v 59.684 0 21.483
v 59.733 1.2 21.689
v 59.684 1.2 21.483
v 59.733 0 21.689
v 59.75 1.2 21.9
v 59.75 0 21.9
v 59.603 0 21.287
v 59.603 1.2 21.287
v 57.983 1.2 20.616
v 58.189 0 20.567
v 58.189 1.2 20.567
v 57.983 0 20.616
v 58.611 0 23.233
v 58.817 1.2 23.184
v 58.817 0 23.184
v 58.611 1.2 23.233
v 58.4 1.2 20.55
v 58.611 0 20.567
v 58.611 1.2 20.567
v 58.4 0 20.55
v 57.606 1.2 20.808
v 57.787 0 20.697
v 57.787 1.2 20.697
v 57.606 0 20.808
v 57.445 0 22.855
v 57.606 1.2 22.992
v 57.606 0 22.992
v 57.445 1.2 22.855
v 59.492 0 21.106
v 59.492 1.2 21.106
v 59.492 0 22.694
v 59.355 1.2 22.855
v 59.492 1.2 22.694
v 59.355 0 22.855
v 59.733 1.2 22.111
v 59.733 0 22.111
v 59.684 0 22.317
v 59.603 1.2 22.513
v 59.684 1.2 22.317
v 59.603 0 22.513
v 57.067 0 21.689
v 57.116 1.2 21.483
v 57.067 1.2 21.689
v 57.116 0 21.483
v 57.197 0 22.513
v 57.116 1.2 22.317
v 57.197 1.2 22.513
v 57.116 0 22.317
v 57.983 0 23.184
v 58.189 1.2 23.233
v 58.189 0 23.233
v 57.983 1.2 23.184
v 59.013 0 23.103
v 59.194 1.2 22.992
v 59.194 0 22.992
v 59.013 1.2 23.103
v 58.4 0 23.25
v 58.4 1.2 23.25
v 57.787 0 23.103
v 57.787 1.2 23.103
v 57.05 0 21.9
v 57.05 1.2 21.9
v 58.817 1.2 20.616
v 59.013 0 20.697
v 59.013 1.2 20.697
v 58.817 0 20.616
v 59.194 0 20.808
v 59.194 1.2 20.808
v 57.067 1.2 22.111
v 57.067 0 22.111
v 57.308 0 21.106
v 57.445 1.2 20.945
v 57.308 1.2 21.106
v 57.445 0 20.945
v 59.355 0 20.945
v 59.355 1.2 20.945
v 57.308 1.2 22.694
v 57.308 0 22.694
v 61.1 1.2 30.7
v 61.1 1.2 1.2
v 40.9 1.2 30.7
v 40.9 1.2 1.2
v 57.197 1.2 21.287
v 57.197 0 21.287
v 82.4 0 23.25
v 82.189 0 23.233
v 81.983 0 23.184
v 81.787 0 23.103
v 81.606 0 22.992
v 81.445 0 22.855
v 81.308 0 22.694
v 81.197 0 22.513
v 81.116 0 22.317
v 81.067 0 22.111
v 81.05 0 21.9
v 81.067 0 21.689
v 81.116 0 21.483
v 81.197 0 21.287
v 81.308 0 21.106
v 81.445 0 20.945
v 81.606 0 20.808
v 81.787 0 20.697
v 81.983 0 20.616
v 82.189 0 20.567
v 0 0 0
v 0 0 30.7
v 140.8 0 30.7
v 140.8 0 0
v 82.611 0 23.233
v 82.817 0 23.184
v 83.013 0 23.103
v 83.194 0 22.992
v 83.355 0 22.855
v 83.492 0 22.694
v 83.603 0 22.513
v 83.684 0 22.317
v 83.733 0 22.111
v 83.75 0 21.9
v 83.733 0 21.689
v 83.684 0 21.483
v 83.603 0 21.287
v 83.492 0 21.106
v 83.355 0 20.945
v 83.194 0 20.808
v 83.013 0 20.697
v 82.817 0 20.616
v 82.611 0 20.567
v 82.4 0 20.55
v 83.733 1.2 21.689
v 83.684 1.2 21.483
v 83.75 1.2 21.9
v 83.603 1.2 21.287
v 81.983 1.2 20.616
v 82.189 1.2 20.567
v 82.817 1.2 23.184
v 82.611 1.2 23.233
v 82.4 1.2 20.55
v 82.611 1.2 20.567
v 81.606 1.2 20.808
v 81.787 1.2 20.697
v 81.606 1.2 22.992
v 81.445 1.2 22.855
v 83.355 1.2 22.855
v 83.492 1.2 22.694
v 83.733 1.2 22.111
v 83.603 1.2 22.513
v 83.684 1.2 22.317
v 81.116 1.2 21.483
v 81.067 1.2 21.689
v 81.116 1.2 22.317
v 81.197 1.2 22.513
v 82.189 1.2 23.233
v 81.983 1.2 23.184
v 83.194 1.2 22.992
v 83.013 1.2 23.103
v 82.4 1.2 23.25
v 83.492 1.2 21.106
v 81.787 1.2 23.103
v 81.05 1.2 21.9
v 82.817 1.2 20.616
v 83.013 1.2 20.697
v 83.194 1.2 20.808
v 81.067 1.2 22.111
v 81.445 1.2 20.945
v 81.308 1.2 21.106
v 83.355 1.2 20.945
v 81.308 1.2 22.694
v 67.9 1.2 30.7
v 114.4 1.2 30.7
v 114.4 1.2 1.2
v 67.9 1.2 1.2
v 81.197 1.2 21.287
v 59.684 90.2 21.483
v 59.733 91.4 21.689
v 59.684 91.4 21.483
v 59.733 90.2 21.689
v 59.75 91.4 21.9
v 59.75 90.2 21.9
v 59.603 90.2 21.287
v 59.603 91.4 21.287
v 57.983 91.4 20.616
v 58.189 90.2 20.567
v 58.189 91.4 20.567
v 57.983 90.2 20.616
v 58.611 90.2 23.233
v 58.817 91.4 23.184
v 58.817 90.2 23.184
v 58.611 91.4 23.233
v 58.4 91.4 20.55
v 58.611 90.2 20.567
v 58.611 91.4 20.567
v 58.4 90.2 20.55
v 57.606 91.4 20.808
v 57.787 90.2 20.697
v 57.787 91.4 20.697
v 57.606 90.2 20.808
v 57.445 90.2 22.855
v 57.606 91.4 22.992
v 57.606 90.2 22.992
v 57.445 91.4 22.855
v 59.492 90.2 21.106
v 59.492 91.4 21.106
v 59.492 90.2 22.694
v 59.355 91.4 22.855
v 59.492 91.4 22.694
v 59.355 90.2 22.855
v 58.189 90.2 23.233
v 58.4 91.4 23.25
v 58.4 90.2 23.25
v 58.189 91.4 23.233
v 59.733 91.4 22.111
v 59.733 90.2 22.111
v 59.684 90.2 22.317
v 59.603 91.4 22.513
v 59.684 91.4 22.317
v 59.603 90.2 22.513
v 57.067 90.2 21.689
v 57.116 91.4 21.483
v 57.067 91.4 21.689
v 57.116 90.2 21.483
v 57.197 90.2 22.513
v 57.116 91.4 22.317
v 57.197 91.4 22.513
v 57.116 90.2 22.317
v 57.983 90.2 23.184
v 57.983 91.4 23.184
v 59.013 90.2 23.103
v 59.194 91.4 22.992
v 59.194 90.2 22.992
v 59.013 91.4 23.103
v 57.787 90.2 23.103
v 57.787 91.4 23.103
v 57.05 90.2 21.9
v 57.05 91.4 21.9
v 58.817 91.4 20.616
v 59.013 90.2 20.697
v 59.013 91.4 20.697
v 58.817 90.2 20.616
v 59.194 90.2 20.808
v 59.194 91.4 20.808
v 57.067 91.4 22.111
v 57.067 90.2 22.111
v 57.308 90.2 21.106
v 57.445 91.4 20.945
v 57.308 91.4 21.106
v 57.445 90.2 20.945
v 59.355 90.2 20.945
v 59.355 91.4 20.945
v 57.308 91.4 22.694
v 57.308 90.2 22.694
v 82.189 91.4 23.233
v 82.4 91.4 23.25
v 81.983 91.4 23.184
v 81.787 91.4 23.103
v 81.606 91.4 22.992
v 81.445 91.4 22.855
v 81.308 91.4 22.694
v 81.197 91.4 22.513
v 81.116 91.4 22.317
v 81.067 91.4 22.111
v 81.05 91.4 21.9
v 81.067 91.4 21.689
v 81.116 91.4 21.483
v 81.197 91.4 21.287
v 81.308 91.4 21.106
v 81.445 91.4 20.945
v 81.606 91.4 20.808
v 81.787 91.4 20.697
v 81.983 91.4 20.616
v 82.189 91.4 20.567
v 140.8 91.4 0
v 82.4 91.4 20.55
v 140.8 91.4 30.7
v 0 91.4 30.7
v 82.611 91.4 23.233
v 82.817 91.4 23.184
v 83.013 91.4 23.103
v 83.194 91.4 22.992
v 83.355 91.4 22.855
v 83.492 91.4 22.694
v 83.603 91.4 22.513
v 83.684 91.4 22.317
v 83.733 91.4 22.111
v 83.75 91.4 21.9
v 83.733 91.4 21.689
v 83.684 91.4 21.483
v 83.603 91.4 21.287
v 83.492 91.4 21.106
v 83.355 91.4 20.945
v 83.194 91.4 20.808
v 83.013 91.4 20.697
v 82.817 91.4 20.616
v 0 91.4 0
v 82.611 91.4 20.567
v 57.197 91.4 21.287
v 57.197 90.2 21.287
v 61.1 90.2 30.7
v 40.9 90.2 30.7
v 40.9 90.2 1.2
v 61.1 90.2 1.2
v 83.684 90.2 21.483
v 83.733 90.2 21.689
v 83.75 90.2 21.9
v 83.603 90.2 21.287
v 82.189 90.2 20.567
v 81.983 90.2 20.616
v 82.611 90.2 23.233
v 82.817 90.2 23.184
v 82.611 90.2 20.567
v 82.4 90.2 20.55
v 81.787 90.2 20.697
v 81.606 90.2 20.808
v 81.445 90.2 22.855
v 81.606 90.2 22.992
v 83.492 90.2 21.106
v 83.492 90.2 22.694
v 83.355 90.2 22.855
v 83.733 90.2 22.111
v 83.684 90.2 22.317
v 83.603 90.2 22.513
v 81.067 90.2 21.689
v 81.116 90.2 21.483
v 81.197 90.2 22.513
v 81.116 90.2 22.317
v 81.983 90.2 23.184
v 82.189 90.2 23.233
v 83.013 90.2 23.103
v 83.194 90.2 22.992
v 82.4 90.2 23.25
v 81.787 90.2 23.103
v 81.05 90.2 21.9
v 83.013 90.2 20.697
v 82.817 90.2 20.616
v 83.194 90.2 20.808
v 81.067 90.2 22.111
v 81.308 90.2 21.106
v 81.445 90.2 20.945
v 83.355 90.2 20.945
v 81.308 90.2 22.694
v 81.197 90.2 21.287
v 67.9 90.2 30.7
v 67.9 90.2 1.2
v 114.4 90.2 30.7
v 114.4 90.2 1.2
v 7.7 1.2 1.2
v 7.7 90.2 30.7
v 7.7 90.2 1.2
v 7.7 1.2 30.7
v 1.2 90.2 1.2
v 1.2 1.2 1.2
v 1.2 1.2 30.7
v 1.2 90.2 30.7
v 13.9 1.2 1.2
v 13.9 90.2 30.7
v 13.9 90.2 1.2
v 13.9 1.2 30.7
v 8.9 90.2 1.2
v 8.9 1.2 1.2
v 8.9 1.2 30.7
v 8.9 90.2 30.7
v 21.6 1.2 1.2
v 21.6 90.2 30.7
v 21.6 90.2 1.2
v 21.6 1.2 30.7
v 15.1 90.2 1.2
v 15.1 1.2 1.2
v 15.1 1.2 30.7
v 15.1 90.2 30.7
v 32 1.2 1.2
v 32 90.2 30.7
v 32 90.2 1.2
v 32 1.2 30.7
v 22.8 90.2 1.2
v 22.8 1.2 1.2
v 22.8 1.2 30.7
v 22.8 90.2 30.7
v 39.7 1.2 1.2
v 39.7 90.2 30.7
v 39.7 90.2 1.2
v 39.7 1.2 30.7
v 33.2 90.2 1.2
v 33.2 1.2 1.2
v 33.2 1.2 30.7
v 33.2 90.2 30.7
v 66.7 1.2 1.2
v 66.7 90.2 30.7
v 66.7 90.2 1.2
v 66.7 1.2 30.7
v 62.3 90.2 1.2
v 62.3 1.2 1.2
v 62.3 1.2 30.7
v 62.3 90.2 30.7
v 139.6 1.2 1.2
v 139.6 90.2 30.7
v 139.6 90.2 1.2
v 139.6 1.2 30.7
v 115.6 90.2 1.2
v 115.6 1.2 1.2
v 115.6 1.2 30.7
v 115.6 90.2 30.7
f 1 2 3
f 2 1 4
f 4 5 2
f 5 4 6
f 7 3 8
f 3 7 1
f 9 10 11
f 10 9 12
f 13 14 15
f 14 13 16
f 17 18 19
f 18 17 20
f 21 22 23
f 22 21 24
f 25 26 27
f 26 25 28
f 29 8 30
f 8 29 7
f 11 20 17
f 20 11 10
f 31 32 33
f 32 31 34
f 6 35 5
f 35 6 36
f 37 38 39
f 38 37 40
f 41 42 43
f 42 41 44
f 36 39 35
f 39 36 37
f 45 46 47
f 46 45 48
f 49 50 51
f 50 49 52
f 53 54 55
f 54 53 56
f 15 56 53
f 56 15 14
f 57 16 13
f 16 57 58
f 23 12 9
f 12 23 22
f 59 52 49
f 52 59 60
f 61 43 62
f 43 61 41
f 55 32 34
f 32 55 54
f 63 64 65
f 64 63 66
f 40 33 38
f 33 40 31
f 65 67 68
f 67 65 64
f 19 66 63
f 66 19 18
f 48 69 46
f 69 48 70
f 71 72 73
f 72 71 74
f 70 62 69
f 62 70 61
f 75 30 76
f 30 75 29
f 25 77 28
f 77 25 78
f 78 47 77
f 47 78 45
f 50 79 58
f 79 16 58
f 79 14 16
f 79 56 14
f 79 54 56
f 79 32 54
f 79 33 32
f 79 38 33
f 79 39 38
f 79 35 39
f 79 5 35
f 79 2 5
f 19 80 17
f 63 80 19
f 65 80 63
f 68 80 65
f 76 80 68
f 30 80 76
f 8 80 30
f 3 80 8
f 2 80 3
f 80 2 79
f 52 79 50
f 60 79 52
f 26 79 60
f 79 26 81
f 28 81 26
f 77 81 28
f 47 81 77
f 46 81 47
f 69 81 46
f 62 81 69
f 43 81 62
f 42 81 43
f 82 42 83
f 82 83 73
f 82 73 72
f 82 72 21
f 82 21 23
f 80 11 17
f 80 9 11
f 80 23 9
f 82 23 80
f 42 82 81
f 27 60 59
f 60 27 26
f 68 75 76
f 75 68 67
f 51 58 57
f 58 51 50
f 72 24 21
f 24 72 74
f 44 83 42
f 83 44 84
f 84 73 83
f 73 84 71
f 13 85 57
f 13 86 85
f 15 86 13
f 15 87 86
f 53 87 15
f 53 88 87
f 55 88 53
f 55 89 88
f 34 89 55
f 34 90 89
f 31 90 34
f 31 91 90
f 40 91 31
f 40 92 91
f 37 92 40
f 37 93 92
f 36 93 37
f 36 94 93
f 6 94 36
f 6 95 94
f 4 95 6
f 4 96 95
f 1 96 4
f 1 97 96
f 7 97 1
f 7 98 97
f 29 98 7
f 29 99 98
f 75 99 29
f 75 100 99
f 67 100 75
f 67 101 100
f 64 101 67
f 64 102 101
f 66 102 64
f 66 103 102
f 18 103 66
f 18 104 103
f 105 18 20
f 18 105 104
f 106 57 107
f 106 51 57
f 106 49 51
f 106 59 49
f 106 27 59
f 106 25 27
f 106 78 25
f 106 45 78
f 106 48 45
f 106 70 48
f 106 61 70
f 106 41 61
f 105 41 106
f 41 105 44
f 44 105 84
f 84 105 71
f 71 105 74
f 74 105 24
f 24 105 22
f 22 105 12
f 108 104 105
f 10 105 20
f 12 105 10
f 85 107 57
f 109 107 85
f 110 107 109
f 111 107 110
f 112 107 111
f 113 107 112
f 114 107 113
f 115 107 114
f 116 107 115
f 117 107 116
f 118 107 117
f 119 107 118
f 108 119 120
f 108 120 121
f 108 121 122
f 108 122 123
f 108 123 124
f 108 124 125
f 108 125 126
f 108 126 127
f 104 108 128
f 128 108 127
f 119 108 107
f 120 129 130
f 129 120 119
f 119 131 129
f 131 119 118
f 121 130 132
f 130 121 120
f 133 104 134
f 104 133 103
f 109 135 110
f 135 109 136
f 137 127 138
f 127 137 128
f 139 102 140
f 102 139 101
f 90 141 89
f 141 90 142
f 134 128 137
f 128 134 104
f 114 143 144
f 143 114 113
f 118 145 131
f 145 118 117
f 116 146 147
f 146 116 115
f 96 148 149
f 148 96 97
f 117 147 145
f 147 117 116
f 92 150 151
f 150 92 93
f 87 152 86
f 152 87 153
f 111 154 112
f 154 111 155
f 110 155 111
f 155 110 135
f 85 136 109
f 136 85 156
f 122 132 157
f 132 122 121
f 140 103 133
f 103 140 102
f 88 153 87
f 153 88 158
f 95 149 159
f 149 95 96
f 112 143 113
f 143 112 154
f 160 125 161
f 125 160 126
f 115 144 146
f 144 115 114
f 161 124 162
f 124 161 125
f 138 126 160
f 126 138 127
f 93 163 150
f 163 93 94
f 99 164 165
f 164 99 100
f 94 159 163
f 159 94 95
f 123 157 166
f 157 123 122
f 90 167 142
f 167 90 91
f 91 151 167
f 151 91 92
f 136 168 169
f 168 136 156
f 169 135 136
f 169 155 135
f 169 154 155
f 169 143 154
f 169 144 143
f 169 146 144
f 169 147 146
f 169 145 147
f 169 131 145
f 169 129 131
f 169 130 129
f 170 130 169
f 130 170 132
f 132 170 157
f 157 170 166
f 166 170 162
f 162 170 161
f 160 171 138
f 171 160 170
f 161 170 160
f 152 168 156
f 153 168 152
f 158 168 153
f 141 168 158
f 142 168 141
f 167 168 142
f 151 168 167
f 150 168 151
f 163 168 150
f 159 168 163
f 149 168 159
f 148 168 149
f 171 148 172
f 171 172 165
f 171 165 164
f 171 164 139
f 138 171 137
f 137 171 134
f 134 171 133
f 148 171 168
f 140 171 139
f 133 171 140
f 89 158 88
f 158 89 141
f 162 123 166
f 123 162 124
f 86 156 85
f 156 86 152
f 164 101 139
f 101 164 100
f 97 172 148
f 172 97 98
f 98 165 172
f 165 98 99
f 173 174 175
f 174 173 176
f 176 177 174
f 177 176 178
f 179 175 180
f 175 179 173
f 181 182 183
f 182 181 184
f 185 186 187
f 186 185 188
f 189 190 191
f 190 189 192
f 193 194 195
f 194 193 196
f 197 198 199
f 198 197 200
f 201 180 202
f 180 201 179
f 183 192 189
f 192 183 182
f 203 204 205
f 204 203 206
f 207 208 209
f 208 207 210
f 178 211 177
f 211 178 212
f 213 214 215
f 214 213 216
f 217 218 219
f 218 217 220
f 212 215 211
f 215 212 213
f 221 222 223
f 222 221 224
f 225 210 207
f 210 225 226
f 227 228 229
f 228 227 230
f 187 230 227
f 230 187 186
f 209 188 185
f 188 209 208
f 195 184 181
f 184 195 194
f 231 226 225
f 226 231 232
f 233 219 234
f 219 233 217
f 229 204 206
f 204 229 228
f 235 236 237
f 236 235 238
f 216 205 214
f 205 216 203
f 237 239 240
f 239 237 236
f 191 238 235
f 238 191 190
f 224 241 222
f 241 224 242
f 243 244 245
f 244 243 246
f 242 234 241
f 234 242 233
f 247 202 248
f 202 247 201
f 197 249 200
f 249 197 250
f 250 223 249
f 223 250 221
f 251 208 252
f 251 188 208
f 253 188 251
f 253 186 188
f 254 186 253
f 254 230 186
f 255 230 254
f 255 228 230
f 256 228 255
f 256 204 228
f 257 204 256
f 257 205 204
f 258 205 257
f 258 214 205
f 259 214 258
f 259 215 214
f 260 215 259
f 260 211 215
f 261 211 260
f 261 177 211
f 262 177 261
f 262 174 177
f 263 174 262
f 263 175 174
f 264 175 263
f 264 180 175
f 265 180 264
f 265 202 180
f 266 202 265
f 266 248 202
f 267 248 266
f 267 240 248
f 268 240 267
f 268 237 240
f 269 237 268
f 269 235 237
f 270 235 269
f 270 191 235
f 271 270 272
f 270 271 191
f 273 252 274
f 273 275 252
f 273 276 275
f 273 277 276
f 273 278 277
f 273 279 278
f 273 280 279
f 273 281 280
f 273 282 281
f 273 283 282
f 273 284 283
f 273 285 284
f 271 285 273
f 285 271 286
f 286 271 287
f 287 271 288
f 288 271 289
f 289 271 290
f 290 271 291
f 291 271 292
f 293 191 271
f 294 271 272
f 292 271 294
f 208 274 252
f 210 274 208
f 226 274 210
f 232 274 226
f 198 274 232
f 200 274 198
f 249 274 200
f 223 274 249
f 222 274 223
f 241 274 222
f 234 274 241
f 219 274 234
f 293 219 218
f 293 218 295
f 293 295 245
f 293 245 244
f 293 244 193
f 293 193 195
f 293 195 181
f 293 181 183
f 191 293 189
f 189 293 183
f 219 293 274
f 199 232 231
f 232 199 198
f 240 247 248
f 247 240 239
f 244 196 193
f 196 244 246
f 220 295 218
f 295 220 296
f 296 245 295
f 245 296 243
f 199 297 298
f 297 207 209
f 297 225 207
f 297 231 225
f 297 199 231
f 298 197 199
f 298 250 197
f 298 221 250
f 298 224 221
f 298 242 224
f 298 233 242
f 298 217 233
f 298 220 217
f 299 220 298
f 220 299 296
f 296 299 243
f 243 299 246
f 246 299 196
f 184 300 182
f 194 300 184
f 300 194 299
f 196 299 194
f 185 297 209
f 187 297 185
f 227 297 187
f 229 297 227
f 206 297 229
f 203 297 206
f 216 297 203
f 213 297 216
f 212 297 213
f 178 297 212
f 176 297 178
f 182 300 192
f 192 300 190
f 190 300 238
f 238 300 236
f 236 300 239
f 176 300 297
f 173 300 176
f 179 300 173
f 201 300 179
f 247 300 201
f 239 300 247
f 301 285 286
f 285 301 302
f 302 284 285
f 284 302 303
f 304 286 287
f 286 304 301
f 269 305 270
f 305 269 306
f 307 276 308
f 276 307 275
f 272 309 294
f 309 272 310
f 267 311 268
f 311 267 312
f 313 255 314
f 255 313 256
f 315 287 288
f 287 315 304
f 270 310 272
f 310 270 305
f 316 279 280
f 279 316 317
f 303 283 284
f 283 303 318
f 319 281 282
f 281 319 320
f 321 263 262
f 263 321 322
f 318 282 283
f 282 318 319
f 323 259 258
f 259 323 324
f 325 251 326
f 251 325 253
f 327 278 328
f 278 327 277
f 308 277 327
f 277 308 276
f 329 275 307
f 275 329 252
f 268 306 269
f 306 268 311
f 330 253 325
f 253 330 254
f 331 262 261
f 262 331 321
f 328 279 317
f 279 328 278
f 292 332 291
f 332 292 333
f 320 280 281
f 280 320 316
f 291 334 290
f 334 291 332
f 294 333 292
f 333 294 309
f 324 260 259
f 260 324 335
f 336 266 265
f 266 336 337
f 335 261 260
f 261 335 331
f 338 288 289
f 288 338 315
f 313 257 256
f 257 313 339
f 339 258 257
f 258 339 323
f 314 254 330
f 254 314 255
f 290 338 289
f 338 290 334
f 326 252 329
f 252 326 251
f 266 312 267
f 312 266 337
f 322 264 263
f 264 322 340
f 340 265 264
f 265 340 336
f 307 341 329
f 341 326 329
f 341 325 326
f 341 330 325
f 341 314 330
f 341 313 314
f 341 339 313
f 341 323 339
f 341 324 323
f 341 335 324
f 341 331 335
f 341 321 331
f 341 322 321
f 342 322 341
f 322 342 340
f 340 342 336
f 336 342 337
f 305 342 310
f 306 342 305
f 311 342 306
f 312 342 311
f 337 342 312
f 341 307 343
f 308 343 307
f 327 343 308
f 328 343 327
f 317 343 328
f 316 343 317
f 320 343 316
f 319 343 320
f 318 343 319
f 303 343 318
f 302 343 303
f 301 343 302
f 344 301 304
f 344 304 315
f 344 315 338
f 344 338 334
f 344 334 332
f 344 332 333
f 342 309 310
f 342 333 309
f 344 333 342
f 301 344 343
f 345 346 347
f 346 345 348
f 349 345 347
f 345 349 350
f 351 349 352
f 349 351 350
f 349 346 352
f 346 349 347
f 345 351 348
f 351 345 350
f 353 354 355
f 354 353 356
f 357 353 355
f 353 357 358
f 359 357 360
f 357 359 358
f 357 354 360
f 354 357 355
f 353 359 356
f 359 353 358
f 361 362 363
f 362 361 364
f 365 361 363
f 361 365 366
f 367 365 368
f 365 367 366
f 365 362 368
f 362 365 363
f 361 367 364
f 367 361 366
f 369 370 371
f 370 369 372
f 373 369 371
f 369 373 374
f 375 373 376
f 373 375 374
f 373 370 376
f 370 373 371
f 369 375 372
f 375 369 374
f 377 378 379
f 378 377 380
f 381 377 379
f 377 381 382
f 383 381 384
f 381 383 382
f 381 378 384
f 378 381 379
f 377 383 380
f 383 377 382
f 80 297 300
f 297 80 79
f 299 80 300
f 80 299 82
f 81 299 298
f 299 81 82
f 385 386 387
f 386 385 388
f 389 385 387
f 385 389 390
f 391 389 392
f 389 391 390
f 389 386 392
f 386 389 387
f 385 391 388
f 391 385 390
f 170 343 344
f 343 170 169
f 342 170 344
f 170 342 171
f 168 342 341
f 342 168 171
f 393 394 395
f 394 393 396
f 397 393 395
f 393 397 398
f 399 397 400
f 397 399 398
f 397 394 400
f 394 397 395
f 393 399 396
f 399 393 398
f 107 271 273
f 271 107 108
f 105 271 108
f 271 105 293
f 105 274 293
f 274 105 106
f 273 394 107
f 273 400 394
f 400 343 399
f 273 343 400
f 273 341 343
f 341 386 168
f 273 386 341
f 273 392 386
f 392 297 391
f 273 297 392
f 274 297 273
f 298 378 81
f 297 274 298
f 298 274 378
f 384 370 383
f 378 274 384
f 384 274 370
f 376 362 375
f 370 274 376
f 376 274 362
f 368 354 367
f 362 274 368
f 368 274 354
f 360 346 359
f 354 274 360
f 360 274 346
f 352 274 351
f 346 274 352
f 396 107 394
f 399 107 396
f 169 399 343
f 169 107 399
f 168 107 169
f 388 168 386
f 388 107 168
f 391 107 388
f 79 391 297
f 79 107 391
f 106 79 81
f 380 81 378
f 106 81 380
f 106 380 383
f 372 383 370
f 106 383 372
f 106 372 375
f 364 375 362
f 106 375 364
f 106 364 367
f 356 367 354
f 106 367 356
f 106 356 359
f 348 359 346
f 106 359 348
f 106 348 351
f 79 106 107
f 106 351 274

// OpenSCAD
//All dimensions are in mm

Wall = 1.2;
Space = 2;

Card_x = 87 + Space;
Card_y = 57 + Space;
Card_z = 0.3;

Card_Fistful = 15;
Card_Fistful_z = (Card_Fistful * Card_z) + Space;
Card_WildWest = 10;
Card_WildWest_z = (Card_WildWest * Card_z) + Space;
Card_HighNoon = 15;
Card_HighNoon_z = (Card_HighNoon * Card_z) + Space;
Card_GoldRush = 24;
Card_GoldRush_z = (Card_GoldRush * Card_z) + Space;

Card_Role = 15;
Card_Role_z = (Card_Role * Card_z) + Space;
Card_Persons = 54;
Card_Persons_z = (Card_Persons * Card_z) + (2 * Space);

Card_Advice = 8;
Card_Advice_z = (Card_Advice * Card_z) + Space;

Card_Other = 135;
Card_Other_z = (Card_Other * Card_z) + (3 * Space);

Gold_x = Card_x;
Gold_y = Card_y;
Gold_z = 24;

Slots = 9;

Magnet_dia = 9.5 + 0.2;
Magnet_h = 3.3 + 0.2;

Hinge_Holes = 24;
Hinge_HoleAxis = 8.8;
Hinge_HolesDia = 2.7;

Show_DownBlock = true;
Show_UpBlockLeft = false;
Show_UpBlockRight = false;

module Block_Down()
{
  difference()
  {
    cube([((Slots + 1) * Wall) + Card_Fistful_z + Card_WildWest_z + Card_HighNoon_z + Card_GoldRush_z + Card_Role_z + Card_Persons_z + Card_Advice_z + Card_Other_z + Gold_z, (2 * Wall) + Card_x, (2 * Wall) + Card_y]);
    union()
    {
      translate([((((Slots + 1) * Wall) + Card_Fistful_z + Card_WildWest_z + Card_HighNoon_z + Card_GoldRush_z + Card_Role_z + Card_Persons_z + Card_Advice_z + Card_Other_z + Gold_z) / 2) - (Hinge_Holes / 2), 0, (((2 * Wall) + Card_y) / 2) - Hinge_HoleAxis])
      {
        rotate([-90, 0, 0])
        {
          cylinder(d = Hinge_HolesDia, h = Wall, $fn = 40);
        }
      }
      translate([((((Slots + 1) * Wall) + Card_Fistful_z + Card_WildWest_z + Card_HighNoon_z + Card_GoldRush_z + Card_Role_z + Card_Persons_z + Card_Advice_z + Card_Other_z + Gold_z) / 2) + (Hinge_Holes / 2), 0, (((2 * Wall) + Card_y) / 2) - Hinge_HoleAxis])
      {
        rotate([-90, 0, 0])
        {
          cylinder(d = Hinge_HolesDia, h = Wall, $fn = 40);
        }
      }
      translate([((((Slots + 1) * Wall) + Card_Fistful_z + Card_WildWest_z + Card_HighNoon_z + Card_GoldRush_z + Card_Role_z + Card_Persons_z + Card_Advice_z + Card_Other_z + Gold_z) / 2) - (Hinge_Holes / 2), Wall + Card_x, (((2 * Wall) + Card_y) / 2) - Hinge_HoleAxis])
      {
        rotate([-90, 0, 0])
        {
          cylinder(d = Hinge_HolesDia, h = Wall, $fn = 40);
        }
      }
      translate([((((Slots + 1) * Wall) + Card_Fistful_z + Card_WildWest_z + Card_HighNoon_z + Card_GoldRush_z + Card_Role_z + Card_Persons_z + Card_Advice_z + Card_Other_z + Gold_z) / 2) + (Hinge_Holes / 2), Wall + Card_x, (((2 * Wall) + Card_y) / 2) - Hinge_HoleAxis])
      {
        rotate([-90, 0, 0])
        {
          cylinder(d = Hinge_HolesDia, h = Wall, $fn = 40);
        }
      }
      translate([(1 * Wall), Wall, Wall])
      {
        cube([Card_Fistful_z, Card_x, Card_y]);
      }
      translate([(2 * Wall) + Card_Fistful_z, Wall, Wall])
      {
        cube([Card_WildWest_z, Card_x, Card_y]);
      }
      translate([(3 * Wall) + Card_Fistful_z + Card_WildWest_z, Wall, Wall])
      {
        cube([Card_HighNoon_z, Card_x, Card_y]);
      }
      translate([(4 * Wall) + Card_Fistful_z + Card_WildWest_z + Card_HighNoon_z, Wall, Wall])
      {
        cube([Card_GoldRush_z, Card_x, Card_y]);
      }
      translate([(5 * Wall) + Card_Fistful_z + Card_WildWest_z + Card_HighNoon_z + Card_GoldRush_z, Wall, Wall])
      {
        cube([Card_Role_z, Card_x, Card_y]);
      }
      translate([(6 * Wall) + Card_Fistful_z + Card_WildWest_z + Card_HighNoon_z + Card_GoldRush_z + Card_Role_z, Wall, Wall])
      {
        cube([Card_Persons_z, Card_x, Card_y]);
      }
      translate([(7 * Wall) + Card_Fistful_z + Card_WildWest_z + Card_HighNoon_z + Card_GoldRush_z + Card_Role_z + Card_Persons_z, Wall, Wall])
      {
        cube([Card_Advice_z, Card_x, Card_y]);
      }
      translate([(8 * Wall) + Card_Fistful_z + Card_WildWest_z + Card_HighNoon_z + Card_GoldRush_z + Card_Role_z + Card_Persons_z + Card_Advice_z, Wall, Wall])
      {
        cube([Card_Other_z, Card_x, Card_y]);
      }
      translate([(9 * Wall) + Card_Fistful_z + Card_WildWest_z + Card_HighNoon_z + Card_GoldRush_z + Card_Role_z + Card_Persons_z + Card_Advice_z + Card_Other_z, Wall, Wall])
      {
        cube([Gold_z, Card_x, Card_y]);
      }
    }
  }
}

module Block_Up()
{
  difference()
  {
    cube([((Slots + 1) * Wall) + Card_Fistful_z + Card_WildWest_z + Card_HighNoon_z + Card_GoldRush_z + Card_Role_z + Card_Persons_z + Card_Advice_z + Card_Other_z + Gold_z, (2 * Wall) + Card_x, (2 * Wall) + Card_y]);
    union()
    {
      translate([(Wall), Wall, Wall])
      {
        cube([((Slots - 1) * Wall) + Card_Fistful_z + Card_WildWest_z + Card_HighNoon_z + Card_GoldRush_z + Card_Role_z + Card_Persons_z + Card_Advice_z + Card_Other_z + Gold_z, Card_x, Card_y]);
      }
      translate([((((Slots + 1) * Wall) + Card_Fistful_z + Card_WildWest_z + Card_HighNoon_z + Card_GoldRush_z + Card_Role_z + Card_Persons_z + Card_Advice_z + Card_Other_z + Gold_z) / 2) - (Hinge_Holes / 2), 0, (((2 * Wall) + Card_y) / 2) - Hinge_HoleAxis])
      {
        rotate([-90, 0, 0])
        {
          cylinder(d = Hinge_HolesDia, h = Wall, $fn = 40);
        }
      }
      translate([((((Slots + 1) * Wall) + Card_Fistful_z + Card_WildWest_z + Card_HighNoon_z + Card_GoldRush_z + Card_Role_z + Card_Persons_z + Card_Advice_z + Card_Other_z + Gold_z) / 2) + (Hinge_Holes / 2), 0, (((2 * Wall) + Card_y) / 2) - Hinge_HoleAxis])
      {
        rotate([-90, 0, 0])
        {
          cylinder(d = Hinge_HolesDia, h = Wall, $fn = 40);
        }
      }
      translate([((((Slots + 1) * Wall) + Card_Fistful_z + Card_WildWest_z + Card_HighNoon_z + Card_GoldRush_z + Card_Role_z + Card_Persons_z + Card_Advice_z + Card_Other_z + Gold_z) / 2) - (Hinge_Holes / 2), Wall + Card_x, (((2 * Wall) + Card_y) / 2) - Hinge_HoleAxis])
      {
        rotate([-90, 0, 0])
        {
          cylinder(d = Hinge_HolesDia, h = Wall, $fn = 40);
        }
      }
      translate([((((Slots + 1) * Wall) + Card_Fistful_z + Card_WildWest_z + Card_HighNoon_z + Card_GoldRush_z + Card_Role_z + Card_Persons_z + Card_Advice_z + Card_Other_z + Gold_z) / 2) + (Hinge_Holes / 2), Wall + Card_x, (((2 * Wall) + Card_y) / 2) - Hinge_HoleAxis])
      {
        rotate([-90, 0, 0])
        {
          cylinder(d = Hinge_HolesDia, h = Wall, $fn = 40);
        }
      }
    }
  }
}
module MagnetSlot()
{
    difference()
    {
      cube([Magnet_dia + Wall, Magnet_h + Wall, Magnet_dia + Wall]);
      union()
      {
        translate([Magnet_dia / 2, Wall, Magnet_dia / 2])
        {
          rotate([-90, 0, 0])
          {
            cylinder(d = Magnet_dia, h = Magnet_h, $fn = 40);
          }
        }
      }
      translate([Magnet_dia / 2, -0.0001, Magnet_dia / 2])
      {
        rotate([-90, -90, 0])
        {
          intersection()
          {
            difference()
            {
              cylinder(d = Magnet_dia + 7*Wall, h = Magnet_h + Wall+1, $fn = 40);
              cylinder(d = Magnet_dia + 2*Wall, h = Magnet_h + Wall+1, $fn = 40);
            }
            translate([0, 0, 0])
            {
              cube([Magnet_dia + 5*Wall, Magnet_dia + 3*Wall, Magnet_h + Wall+1]);
            }
          }
        }
      }
    }
  
}
if(Show_DownBlock)
{
  difference()
  {
    Block_Down();
    translate([0, 0, ((2 * Wall) + Card_y) / 2])
    {
      cube([((Slots + 1) * Wall) + Card_Fistful_z + Card_WildWest_z + Card_HighNoon_z + Card_GoldRush_z + Card_Role_z + Card_Persons_z + Card_Advice_z + Card_Other_z + Gold_z, (2 * Wall) + Card_x, ((2 * Wall) + Card_y) / 2]);
    }
  }
}
if(Show_UpBlockLeft)
{
  union()
  {
    translate([Wall, (((2 * Wall) + Card_x) / 2) - (Magnet_h + Wall), Wall])
    {
      MagnetSlot();
    }
    intersection()
    {
      Block_Up();

      cube([((Slots + 1) * Wall) + Card_Fistful_z + Card_WildWest_z + Card_HighNoon_z + Card_GoldRush_z + Card_Role_z + Card_Persons_z + Card_Advice_z + Card_Other_z + Gold_z, ((2 * Wall) + Card_x) / 2, ((2 * Wall) + Card_y) / 2]);
    }
  }
}
if(Show_UpBlockRight)
{
  union()
  {
    translate([((Slots + 1) * Wall) + Card_Fistful_z + Card_WildWest_z + Card_HighNoon_z + Card_GoldRush_z + Card_Role_z + Card_Persons_z + Card_Advice_z + Card_Other_z + Gold_z - (Wall), (((2 * Wall) + Card_x) / 2) - (Magnet_h + Wall), Wall])
    {
      rotate([0, -90, 0])
      {
        MagnetSlot();
      }
    }
    intersection()
    {
      Block_Up();

      cube([((Slots + 1) * Wall) + Card_Fistful_z + Card_WildWest_z + Card_HighNoon_z + Card_GoldRush_z + Card_Role_z + Card_Persons_z + Card_Advice_z + Card_Other_z + Gold_z, ((2 * Wall) + Card_x) / 2, ((2 * Wall) + Card_y) / 2]);
    }
  }
}
